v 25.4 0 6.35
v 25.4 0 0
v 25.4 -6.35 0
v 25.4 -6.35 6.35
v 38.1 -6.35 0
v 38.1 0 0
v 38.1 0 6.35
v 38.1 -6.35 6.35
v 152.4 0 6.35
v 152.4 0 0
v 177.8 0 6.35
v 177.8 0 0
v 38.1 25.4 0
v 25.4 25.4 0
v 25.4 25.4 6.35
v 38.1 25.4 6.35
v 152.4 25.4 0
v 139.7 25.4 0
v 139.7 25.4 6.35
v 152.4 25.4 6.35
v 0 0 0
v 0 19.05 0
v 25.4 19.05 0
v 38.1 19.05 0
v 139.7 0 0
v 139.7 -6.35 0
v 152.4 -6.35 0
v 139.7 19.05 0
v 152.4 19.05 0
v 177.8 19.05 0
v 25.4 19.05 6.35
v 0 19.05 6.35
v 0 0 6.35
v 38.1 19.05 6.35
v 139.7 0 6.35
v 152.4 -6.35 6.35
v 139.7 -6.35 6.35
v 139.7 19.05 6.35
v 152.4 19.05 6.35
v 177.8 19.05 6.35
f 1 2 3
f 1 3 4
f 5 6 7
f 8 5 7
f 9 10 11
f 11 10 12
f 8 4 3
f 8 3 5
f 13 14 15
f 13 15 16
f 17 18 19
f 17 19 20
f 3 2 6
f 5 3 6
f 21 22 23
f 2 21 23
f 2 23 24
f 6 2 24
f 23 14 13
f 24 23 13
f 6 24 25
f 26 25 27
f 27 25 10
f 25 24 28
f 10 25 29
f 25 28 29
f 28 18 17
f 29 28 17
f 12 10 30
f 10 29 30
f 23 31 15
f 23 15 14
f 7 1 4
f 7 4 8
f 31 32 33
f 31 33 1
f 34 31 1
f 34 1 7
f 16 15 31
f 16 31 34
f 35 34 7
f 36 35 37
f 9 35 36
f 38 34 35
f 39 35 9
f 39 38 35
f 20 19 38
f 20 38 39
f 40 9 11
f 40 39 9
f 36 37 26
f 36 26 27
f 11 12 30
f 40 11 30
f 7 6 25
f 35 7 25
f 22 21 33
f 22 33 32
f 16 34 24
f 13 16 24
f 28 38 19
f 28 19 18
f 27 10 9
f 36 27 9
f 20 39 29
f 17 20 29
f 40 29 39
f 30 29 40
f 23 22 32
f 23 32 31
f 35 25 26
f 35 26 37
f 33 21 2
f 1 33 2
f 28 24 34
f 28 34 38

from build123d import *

# Parameters (mm, degrees)
SKETCH1_W           = 177.8
SKETCH1_H           = 19.05
BOSS_EXTRUDE1_DEPTH = 6.35
SKETCH2_W           = 12.7
SKETCH2_H           = 6.35
BOSS_EXTRUDE2_DEPTH = 6.35
SKETCH3_W           = 12.7
SKETCH3_H           = 6.35
BOSS_EXTRUDE3_DEPTH = 6.35


with BuildPart() as part:
    # Sketch1 → Boss-Extrude1 (new body)
    with BuildSketch(Plane.XY):
        with Locations((88.9, 9.525)):
            Rectangle(SKETCH1_W, SKETCH1_H)
    extrude(amount=BOSS_EXTRUDE1_DEPTH)

    # Sketch2 → Boss-Extrude2 (add)
    with BuildSketch(Plane(origin=(0, 19.05, 0), x_dir=(1, 0, 0), z_dir=(0, 1, 0))):
        with Locations((31.75, -3.175)):
            Rectangle(SKETCH2_W, SKETCH2_H)
        with Locations((146.05, -3.175)):
            Rectangle(SKETCH2_W, SKETCH2_H)
    extrude(amount=BOSS_EXTRUDE2_DEPTH)

    # Sketch3 → Boss-Extrude3 (add)
    with BuildSketch(Plane.XZ):
        with Locations((31.75, 3.175)):
            Rectangle(SKETCH3_W, SKETCH3_H)
        with Locations((146.05, 3.175)):
            Rectangle(SKETCH3_W, SKETCH3_H)
    extrude(amount=BOSS_EXTRUDE3_DEPTH)


solid = part.part
